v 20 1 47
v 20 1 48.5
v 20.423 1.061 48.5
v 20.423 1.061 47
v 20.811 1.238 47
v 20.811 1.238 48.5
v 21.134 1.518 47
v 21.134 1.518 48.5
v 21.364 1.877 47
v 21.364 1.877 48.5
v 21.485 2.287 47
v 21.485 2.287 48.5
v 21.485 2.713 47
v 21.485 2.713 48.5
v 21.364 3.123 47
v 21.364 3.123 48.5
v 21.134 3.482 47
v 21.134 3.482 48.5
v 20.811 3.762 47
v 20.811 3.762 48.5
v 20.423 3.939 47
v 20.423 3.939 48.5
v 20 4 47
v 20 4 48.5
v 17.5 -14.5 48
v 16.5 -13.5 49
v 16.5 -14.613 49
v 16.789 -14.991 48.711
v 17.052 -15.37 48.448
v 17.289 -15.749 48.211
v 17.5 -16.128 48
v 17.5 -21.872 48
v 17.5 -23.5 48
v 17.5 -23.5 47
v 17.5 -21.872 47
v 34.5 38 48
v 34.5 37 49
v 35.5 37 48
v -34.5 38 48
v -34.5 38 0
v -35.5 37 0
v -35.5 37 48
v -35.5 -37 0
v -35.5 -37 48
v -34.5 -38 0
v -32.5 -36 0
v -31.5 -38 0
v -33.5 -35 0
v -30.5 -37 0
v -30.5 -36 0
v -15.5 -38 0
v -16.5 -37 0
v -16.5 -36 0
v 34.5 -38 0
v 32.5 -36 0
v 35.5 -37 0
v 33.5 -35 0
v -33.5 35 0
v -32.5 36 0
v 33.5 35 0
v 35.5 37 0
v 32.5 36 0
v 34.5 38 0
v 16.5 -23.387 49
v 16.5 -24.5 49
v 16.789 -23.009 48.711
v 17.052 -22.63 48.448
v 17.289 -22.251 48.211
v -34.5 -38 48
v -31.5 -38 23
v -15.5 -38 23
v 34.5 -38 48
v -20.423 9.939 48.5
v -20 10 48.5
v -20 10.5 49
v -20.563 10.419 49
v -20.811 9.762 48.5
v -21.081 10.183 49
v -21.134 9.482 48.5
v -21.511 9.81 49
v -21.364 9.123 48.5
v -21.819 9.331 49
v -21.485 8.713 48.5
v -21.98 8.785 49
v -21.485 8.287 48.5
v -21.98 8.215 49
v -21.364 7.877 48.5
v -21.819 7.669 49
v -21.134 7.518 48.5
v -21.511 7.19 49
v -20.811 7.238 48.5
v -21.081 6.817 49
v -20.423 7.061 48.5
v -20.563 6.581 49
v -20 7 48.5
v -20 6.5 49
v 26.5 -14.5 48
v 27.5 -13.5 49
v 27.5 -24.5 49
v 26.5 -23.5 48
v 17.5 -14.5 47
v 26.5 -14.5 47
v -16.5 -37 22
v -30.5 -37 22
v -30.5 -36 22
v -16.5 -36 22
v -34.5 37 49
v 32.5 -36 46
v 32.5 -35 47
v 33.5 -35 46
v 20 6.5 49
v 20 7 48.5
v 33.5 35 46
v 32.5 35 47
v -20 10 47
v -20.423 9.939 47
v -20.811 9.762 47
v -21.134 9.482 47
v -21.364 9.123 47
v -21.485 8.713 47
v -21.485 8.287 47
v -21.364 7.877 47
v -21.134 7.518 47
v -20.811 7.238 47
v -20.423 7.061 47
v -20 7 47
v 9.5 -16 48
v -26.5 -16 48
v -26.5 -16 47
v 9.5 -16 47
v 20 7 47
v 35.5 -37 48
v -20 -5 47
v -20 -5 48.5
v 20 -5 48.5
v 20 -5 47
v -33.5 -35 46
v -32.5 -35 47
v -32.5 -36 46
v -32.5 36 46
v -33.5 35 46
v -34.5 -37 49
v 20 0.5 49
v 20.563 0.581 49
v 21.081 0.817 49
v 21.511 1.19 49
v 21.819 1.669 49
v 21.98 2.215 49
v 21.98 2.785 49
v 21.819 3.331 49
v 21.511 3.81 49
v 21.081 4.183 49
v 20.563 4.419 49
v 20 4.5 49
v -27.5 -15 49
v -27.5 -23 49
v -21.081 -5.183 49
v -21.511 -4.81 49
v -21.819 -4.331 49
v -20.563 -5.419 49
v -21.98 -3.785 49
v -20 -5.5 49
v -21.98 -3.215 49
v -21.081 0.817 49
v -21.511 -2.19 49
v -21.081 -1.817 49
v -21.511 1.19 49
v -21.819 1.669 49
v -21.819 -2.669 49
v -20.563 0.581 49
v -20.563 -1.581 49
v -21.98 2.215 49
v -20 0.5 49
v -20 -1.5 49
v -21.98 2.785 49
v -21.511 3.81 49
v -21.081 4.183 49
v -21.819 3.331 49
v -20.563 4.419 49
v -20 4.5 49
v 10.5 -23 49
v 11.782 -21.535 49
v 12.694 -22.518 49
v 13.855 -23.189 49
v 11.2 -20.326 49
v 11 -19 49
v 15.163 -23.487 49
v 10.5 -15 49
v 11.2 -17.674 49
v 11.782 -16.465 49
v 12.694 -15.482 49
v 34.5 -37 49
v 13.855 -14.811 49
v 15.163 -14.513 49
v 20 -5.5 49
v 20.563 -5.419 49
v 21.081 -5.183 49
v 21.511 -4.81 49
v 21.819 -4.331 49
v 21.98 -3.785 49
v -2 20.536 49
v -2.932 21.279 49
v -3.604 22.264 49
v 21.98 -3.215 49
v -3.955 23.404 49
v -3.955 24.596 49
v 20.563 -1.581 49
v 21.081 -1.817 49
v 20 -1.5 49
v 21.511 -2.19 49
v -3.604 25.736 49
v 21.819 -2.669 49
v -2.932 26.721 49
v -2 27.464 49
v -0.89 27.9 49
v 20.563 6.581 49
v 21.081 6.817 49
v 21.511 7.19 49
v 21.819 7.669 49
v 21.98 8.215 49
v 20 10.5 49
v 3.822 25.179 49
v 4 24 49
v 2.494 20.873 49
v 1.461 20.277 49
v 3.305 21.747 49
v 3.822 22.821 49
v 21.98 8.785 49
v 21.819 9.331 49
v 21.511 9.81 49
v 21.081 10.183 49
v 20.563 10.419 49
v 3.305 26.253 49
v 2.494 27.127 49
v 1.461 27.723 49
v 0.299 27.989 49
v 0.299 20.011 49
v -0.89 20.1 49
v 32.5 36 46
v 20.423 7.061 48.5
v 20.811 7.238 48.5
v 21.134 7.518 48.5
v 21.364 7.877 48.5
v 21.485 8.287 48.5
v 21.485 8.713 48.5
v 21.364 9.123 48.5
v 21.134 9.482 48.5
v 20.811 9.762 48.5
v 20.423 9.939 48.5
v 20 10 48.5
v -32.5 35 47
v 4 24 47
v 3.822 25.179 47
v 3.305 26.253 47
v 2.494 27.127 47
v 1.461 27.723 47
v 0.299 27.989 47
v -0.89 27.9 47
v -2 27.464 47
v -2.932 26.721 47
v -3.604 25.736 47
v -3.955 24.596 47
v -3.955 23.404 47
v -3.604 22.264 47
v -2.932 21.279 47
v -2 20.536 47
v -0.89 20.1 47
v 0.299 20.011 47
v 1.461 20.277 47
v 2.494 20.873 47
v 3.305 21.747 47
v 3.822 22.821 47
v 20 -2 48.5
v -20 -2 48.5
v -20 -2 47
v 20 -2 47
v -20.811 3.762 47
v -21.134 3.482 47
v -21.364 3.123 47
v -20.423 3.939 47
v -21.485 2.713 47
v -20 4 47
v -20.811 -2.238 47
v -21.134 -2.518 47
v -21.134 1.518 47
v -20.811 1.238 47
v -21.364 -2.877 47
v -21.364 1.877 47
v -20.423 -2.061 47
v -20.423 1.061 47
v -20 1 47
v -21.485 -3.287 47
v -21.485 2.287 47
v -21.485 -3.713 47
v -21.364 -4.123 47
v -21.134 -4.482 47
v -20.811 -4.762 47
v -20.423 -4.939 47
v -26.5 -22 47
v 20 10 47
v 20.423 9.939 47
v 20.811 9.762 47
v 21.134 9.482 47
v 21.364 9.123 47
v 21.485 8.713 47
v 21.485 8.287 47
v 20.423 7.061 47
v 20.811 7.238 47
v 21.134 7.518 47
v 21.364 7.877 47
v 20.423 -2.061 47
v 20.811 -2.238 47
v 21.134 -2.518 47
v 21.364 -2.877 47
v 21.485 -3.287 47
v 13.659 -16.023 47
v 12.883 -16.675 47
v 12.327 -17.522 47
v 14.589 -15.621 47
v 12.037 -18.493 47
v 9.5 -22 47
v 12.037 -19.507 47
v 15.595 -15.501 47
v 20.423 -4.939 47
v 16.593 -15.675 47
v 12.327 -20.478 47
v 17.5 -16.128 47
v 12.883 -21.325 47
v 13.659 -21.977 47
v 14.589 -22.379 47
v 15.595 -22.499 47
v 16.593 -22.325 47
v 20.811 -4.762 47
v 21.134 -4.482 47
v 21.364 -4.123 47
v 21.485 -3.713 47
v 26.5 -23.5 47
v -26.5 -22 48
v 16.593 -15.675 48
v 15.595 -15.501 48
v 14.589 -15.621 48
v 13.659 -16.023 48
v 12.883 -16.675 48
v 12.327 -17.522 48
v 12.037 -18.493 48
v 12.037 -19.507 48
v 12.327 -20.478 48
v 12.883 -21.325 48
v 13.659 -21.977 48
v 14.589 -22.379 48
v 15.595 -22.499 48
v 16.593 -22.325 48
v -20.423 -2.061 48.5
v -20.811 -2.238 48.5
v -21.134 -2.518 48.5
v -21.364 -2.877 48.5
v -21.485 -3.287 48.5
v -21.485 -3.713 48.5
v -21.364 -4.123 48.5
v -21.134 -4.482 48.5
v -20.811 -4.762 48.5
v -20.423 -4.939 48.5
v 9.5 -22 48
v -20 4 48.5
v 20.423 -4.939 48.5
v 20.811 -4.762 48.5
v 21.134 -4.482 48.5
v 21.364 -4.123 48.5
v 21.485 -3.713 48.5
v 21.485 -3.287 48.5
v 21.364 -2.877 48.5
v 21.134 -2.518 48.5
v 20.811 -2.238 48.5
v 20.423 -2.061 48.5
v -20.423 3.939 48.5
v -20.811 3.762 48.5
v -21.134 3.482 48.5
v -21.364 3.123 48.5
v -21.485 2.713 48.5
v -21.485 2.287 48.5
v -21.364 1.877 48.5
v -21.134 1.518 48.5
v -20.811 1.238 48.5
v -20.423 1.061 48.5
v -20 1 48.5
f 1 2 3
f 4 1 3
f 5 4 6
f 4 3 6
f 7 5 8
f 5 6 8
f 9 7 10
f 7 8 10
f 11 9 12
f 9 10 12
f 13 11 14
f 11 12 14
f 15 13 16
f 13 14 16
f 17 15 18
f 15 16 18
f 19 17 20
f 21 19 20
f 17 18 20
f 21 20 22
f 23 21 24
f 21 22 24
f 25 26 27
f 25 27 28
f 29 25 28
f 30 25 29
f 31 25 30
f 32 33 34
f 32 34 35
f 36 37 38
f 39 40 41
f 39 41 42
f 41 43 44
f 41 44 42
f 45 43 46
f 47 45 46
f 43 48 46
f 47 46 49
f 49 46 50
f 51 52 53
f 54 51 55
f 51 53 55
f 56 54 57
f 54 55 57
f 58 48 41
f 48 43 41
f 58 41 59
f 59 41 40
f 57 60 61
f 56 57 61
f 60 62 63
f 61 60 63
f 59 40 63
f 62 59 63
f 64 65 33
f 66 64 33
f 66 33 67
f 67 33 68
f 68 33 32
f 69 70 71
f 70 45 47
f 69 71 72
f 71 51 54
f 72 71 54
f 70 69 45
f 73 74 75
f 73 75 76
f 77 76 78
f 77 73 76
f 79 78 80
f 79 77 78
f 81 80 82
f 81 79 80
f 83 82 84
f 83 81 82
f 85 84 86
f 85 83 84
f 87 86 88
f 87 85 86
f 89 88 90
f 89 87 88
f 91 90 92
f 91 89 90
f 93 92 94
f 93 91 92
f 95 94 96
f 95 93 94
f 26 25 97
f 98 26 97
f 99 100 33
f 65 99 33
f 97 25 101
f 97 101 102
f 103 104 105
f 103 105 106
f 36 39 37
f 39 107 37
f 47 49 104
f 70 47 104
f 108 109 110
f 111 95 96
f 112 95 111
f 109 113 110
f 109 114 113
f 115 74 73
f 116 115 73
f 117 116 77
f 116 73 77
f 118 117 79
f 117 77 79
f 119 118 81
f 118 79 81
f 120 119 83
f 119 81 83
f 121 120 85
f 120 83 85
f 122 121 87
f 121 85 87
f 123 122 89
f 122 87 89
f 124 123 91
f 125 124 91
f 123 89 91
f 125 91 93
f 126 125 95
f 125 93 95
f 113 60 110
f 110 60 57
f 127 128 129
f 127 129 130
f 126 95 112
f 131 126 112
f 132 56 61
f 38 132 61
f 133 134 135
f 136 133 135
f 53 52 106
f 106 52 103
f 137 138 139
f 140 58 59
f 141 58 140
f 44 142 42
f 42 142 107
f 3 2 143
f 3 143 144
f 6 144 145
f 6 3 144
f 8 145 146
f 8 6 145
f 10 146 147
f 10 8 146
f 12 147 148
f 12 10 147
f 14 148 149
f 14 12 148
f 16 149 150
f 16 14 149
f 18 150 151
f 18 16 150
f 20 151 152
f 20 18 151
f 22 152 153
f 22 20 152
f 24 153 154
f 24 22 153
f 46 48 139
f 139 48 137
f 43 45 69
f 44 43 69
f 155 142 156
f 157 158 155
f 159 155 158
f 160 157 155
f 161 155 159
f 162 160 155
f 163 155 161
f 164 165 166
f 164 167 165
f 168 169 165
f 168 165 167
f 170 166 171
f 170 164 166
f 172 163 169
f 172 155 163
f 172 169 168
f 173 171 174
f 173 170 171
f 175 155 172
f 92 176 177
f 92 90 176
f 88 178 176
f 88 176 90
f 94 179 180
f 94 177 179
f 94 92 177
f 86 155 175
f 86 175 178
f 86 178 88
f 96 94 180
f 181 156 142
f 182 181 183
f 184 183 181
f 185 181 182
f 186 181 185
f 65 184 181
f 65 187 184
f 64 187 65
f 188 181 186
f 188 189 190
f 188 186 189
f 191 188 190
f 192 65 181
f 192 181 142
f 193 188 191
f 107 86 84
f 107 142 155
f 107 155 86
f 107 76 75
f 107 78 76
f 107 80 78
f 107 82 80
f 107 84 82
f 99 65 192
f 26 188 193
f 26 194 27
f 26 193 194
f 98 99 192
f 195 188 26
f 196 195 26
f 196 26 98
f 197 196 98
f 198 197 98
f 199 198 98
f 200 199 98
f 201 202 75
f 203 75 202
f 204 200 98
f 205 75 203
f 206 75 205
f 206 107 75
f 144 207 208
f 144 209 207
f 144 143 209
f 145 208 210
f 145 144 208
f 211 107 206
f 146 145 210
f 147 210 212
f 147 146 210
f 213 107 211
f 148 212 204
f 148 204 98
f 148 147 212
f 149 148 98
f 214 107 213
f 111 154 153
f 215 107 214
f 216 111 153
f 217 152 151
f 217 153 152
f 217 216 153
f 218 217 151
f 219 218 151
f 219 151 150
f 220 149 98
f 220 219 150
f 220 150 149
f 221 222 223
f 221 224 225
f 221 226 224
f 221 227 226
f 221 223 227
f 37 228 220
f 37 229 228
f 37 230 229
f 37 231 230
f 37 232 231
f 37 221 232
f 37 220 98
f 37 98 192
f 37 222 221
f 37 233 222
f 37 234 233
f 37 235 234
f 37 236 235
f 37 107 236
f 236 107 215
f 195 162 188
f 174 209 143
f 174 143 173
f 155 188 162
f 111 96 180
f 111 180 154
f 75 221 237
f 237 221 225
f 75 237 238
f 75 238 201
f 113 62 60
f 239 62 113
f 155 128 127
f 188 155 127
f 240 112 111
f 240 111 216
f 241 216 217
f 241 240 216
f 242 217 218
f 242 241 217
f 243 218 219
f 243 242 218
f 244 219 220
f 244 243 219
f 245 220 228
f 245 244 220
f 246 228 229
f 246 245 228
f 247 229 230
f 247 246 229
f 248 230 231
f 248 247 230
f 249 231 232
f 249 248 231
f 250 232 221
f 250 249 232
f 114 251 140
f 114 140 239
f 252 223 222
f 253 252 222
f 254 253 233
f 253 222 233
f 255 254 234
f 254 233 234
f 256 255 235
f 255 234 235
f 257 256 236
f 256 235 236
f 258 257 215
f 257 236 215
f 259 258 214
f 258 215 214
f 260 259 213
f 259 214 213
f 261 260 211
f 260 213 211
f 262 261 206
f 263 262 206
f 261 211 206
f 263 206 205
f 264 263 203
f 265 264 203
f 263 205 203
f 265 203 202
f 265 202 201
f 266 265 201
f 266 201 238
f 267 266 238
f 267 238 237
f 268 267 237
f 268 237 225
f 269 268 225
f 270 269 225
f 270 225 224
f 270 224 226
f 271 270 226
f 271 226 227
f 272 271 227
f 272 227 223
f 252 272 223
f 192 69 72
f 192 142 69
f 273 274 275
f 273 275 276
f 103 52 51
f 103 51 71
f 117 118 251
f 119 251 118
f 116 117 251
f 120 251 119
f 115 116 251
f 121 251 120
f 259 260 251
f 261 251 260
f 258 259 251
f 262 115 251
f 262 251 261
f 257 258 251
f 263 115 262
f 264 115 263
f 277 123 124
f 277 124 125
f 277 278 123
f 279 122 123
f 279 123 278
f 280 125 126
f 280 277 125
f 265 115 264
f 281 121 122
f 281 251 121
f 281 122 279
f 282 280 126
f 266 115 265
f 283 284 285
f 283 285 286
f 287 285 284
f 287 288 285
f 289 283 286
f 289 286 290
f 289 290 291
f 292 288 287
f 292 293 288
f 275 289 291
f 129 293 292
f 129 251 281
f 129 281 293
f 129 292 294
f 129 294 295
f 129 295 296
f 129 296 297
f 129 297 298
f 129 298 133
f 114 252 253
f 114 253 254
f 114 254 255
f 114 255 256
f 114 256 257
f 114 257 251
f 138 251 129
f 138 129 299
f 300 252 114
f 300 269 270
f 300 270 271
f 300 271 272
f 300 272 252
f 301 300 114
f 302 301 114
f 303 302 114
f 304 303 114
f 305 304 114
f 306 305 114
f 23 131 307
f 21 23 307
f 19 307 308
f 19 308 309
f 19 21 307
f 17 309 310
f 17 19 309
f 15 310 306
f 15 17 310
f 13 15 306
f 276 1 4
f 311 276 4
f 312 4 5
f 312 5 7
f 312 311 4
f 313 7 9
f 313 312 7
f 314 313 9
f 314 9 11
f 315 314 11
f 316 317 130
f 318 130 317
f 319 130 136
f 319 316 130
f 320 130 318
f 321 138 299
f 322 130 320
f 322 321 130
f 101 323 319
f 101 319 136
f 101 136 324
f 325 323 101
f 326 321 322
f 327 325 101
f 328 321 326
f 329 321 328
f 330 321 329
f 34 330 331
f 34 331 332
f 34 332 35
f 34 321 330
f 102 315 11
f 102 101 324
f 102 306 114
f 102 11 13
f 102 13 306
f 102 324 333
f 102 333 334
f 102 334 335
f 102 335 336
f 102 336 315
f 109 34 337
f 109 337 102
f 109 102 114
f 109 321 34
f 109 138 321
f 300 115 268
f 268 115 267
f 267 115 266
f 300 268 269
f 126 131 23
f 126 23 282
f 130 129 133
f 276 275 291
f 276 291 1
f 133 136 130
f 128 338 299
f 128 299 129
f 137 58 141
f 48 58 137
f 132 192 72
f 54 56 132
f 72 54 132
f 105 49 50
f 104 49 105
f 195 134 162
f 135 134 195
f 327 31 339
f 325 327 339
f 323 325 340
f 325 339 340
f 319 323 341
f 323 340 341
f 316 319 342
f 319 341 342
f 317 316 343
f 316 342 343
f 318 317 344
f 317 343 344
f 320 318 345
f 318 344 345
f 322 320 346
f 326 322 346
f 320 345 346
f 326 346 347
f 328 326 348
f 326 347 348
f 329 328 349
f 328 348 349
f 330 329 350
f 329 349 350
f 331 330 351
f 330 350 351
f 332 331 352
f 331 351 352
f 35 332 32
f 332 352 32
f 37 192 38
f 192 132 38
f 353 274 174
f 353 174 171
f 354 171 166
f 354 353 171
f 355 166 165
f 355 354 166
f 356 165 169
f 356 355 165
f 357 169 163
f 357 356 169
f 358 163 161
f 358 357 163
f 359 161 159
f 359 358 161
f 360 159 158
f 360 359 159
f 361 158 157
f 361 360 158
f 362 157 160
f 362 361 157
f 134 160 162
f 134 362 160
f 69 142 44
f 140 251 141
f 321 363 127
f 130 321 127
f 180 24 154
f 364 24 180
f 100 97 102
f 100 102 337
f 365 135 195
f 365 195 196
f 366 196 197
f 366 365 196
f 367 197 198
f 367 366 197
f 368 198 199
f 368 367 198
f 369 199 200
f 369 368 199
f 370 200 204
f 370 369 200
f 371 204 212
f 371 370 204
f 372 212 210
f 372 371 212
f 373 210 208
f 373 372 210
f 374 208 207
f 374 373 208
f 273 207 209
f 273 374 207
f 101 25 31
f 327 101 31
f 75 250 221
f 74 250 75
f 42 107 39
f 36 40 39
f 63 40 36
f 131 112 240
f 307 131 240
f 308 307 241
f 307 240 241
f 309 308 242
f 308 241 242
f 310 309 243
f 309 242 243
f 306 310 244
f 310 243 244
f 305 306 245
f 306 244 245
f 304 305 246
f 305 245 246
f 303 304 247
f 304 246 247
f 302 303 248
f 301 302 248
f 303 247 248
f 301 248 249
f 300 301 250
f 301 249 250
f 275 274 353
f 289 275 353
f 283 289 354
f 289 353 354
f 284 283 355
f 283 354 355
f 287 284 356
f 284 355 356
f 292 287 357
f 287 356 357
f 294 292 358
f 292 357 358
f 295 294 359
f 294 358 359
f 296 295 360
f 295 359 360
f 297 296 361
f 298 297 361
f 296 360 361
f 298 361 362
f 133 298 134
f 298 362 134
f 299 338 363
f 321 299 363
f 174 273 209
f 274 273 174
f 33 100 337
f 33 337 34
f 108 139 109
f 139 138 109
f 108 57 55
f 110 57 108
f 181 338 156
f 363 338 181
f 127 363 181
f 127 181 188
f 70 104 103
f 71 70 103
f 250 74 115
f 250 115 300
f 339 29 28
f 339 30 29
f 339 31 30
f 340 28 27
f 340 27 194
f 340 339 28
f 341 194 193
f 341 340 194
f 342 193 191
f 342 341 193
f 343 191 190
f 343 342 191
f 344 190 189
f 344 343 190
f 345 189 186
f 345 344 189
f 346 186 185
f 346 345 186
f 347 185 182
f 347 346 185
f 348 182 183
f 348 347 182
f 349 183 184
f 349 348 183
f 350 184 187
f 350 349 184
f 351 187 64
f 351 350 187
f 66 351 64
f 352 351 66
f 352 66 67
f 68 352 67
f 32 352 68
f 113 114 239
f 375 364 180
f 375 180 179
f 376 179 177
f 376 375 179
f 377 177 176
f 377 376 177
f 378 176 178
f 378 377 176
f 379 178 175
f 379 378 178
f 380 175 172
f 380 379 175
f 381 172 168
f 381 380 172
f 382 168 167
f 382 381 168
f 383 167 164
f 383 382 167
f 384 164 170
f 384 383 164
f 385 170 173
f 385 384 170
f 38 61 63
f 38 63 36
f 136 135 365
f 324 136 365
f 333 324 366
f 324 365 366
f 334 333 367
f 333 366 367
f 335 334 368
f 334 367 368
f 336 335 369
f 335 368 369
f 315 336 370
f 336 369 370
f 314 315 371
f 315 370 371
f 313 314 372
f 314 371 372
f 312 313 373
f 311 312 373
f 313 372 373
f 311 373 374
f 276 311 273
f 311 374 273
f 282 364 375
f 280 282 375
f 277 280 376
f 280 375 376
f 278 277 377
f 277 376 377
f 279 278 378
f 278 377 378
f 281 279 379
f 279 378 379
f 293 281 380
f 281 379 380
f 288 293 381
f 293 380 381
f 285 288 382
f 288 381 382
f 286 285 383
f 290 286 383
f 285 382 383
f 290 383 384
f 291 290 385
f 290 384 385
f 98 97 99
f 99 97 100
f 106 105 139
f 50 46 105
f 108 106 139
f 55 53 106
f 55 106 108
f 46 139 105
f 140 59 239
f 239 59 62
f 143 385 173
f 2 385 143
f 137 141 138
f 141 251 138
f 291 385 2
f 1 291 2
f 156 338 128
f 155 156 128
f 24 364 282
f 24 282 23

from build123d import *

# Parameters (mm, degrees)
SKETCH_W        = 71
SKETCH_H        = 76
PAD_DEPTH       = 49
SKETCH001_W     = 67
SKETCH001_H     = 72
POCKET_DEPTH    = 47
SKETCH002_W     = 14
SKETCH002_H     = 22
POCKET001_DEPTH = 2
SKETCH003_R     = 4
SKETCH003_W     = 36
SKETCH003_H     = 6
POCKET002_DEPTH = 49.001
CHAMFER_SIZE    = 1
POCKET003_DEPTH = 49.001
CHAMFER001_SIZE = 0.5


with BuildPart() as part:
    # Sketch → Pad (new body)
    with BuildSketch(Plane.XY):
        Rectangle(SKETCH_W, SKETCH_H)
    extrude(amount=PAD_DEPTH)

    # Sketch001 (on Face5 of Pad) → Pocket (cut)
    with BuildSketch(Plane(origin=(0, 0, 0), x_dir=(1, 0, 0), z_dir=(0, 0, -1))):
        Rectangle(SKETCH001_W, SKETCH001_H)
    extrude(amount=-POCKET_DEPTH, mode=Mode.SUBTRACT)

    # Sketch002 (on Face6 of Pocket) → Pocket001 (cut)
    with BuildSketch(Plane.XZ.offset(38)):
        with Locations((-23.5, 11)):
            Rectangle(SKETCH002_W, SKETCH002_H)
    extrude(amount=-POCKET001_DEPTH, mode=Mode.SUBTRACT)

    # Sketch003 (on Face4 of Pocket001) → Pocket002 (cut, through all)
    with BuildSketch(Plane.XY.offset(49)):
        with Locations((0, 24)):
            Circle(SKETCH003_R)
        with Locations((-8.5, -19)):
            Rectangle(SKETCH003_W, SKETCH003_H)
        with BuildLine():
            Line((26.5, -23.5), (17.5, -23.5))
            Line((17.5, -23.5), (17.5, -21.872281))
            ThreePointArc((17.5, -16.127719), (12, -19), (17.5, -21.872281))
            Line((17.5, -14.5), (17.5, -16.127719))
            Line((17.5, -14.5), (26.5, -14.5))
            Line((26.5, -14.5), (26.5, -23.5))
        make_face()
    extrude(amount=-POCKET002_DEPTH, mode=Mode.SUBTRACT)

    # Chamfer
    chamfer_edges = [part.edges().sort_by_distance(p)[0] for p in [
        (22, -23.5, 49),
        (12, -19, 49),
        (17.5, -22.686141, 49),
        (17.5, -15.313859, 49),
        (22, -14.5, 49),
        (26.5, -19, 49),
        (9.5, -19, 49),
        (-8.5, -22, 49),
        (-8.5, -16, 49),
        (-26.5, -19, 49),
        (0, 38, 49),
        (35.5, 0, 49),
        (0, -38, 49),
        (-35.5, 0, 49),
        (0, -36, 47),
        (33.5, 0, 47),
        (-33.5, 0, 47),
        (0, 36, 47),
        (-35.5, -38, 24.5),
        (-35.5, 38, 24.5),
        (35.5, -38, 24.5),
        (35.5, 38, 24.5),
        (33.5, -36, 23.5),
        (33.5, 36, 23.5),
        (-33.5, 36, 23.5),
        (-33.5, -36, 23.5),
        (-23.5, -38, 22),
        (-30.5, -38, 11),
        (-16.5, -38, 11),
    ]]
    chamfer(chamfer_edges, length=CHAMFER_SIZE)

    # Sketch004 (on Face25 of Chamfer) → Pocket003 (cut, through all)
    with BuildSketch(Plane.XY.offset(49)):
        with BuildLine():
            ThreePointArc((-20, 10), (-21.5, 8.5), (-20, 7))
            Line((-20, 7), (20, 7))
            ThreePointArc((20, 7), (21.5, 8.5), (20, 10))
            Line((-20, 10), (20, 10))
        make_face()
        with BuildLine():
            ThreePointArc((-20, 4), (-21.5, 2.5), (-20, 1))
            Line((-20, 1), (20, 1))
            ThreePointArc((20, 1), (21.5, 2.5), (20, 4))
            Line((-20, 4), (20, 4))
        make_face()
        with BuildLine():
            ThreePointArc((-20, -2), (-21.5, -3.5), (-20, -5))
            Line((-20, -5), (20, -5))
            ThreePointArc((20, -5), (21.5, -3.5), (20, -2))
            Line((-20, -2), (20, -2))
        make_face()
    extrude(amount=-POCKET003_DEPTH, mode=Mode.SUBTRACT)

    # Chamfer001
    chamfer001_edges = [part.edges().sort_by_distance(p)[0] for p in [
        (0, -5, 49),
        (0, 1, 49),
        (0, 7, 49),
    ]]
    chamfer(chamfer001_edges, length=CHAMFER001_SIZE)


solid = part.part
